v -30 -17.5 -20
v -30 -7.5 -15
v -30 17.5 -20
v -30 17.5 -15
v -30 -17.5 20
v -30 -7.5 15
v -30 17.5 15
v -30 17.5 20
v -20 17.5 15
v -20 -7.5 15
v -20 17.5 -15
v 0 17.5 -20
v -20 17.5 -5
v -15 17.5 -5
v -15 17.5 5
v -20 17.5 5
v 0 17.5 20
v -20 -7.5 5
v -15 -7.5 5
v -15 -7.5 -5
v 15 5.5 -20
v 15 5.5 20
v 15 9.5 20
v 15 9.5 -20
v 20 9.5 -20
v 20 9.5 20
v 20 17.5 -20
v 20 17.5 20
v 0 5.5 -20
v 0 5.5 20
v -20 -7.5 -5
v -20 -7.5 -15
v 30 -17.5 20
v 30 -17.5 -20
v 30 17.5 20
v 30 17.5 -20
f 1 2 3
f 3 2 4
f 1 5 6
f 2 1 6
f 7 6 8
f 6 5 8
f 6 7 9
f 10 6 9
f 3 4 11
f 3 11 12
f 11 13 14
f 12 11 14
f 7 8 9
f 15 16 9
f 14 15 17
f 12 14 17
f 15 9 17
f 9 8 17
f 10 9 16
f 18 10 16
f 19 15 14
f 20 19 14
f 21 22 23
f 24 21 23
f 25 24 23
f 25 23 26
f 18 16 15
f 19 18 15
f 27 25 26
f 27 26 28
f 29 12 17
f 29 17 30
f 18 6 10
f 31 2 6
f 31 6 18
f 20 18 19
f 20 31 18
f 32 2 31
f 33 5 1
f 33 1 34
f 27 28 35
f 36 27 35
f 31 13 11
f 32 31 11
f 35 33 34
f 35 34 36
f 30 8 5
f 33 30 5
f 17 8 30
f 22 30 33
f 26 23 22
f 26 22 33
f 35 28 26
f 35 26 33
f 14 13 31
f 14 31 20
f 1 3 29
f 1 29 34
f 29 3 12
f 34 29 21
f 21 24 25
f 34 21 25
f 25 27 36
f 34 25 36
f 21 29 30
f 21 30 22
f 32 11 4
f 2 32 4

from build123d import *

# Parameters (mm, degrees)
SKETCH_1_W          = 60
SKETCH_1_H          = 35
EXTRUDE_1_DEPTH     = 20
SKETCH_2_W          = 5
SKETCH_2_H          = 10
CUT_EXTRUDE_1_DEPTH = 25
SKETCH_3_W          = 5
SKETCH_3_H          = 8
CUT_EXTRUDE_2_DEPTH = 53.974050251


with BuildPart() as part:
    # Эскиз1 → Бобышка-Вытянуть1 (new, symmetric)
    with BuildSketch(Plane.XY):
        Rectangle(SKETCH_1_W, SKETCH_1_H)
    extrude(amount=EXTRUDE_1_DEPTH, both=True)

    # Эскиз2 → Вырез-Вытянуть1 (cut)
    with BuildSketch(Plane(origin=(0, 17.5, 0), x_dir=(1, 0, 0), z_dir=(0, 1, 0))):
        Polygon((-30, 15), (-30, -15), (-20, -15), (-20, -5), (-20, 5), (-20, 15), align=None)
        with Locations((-17.5, 0)):
            Rectangle(SKETCH_2_W, SKETCH_2_H)
    extrude(amount=-CUT_EXTRUDE_1_DEPTH, mode=Mode.SUBTRACT)

    # Эскиз3 → Вырез-Вытянуть2 (cut, through all)
    with BuildSketch(Plane.XY.offset(20)):
        Polygon((0, 17.5), (0, 5.5), (15, 5.5), (15, 9.5), (15, 17.5), align=None)
        with Locations((17.5, 13.5)):
            Rectangle(SKETCH_3_W, SKETCH_3_H)
    extrude(amount=-CUT_EXTRUDE_2_DEPTH, mode=Mode.SUBTRACT)


solid = part.part
